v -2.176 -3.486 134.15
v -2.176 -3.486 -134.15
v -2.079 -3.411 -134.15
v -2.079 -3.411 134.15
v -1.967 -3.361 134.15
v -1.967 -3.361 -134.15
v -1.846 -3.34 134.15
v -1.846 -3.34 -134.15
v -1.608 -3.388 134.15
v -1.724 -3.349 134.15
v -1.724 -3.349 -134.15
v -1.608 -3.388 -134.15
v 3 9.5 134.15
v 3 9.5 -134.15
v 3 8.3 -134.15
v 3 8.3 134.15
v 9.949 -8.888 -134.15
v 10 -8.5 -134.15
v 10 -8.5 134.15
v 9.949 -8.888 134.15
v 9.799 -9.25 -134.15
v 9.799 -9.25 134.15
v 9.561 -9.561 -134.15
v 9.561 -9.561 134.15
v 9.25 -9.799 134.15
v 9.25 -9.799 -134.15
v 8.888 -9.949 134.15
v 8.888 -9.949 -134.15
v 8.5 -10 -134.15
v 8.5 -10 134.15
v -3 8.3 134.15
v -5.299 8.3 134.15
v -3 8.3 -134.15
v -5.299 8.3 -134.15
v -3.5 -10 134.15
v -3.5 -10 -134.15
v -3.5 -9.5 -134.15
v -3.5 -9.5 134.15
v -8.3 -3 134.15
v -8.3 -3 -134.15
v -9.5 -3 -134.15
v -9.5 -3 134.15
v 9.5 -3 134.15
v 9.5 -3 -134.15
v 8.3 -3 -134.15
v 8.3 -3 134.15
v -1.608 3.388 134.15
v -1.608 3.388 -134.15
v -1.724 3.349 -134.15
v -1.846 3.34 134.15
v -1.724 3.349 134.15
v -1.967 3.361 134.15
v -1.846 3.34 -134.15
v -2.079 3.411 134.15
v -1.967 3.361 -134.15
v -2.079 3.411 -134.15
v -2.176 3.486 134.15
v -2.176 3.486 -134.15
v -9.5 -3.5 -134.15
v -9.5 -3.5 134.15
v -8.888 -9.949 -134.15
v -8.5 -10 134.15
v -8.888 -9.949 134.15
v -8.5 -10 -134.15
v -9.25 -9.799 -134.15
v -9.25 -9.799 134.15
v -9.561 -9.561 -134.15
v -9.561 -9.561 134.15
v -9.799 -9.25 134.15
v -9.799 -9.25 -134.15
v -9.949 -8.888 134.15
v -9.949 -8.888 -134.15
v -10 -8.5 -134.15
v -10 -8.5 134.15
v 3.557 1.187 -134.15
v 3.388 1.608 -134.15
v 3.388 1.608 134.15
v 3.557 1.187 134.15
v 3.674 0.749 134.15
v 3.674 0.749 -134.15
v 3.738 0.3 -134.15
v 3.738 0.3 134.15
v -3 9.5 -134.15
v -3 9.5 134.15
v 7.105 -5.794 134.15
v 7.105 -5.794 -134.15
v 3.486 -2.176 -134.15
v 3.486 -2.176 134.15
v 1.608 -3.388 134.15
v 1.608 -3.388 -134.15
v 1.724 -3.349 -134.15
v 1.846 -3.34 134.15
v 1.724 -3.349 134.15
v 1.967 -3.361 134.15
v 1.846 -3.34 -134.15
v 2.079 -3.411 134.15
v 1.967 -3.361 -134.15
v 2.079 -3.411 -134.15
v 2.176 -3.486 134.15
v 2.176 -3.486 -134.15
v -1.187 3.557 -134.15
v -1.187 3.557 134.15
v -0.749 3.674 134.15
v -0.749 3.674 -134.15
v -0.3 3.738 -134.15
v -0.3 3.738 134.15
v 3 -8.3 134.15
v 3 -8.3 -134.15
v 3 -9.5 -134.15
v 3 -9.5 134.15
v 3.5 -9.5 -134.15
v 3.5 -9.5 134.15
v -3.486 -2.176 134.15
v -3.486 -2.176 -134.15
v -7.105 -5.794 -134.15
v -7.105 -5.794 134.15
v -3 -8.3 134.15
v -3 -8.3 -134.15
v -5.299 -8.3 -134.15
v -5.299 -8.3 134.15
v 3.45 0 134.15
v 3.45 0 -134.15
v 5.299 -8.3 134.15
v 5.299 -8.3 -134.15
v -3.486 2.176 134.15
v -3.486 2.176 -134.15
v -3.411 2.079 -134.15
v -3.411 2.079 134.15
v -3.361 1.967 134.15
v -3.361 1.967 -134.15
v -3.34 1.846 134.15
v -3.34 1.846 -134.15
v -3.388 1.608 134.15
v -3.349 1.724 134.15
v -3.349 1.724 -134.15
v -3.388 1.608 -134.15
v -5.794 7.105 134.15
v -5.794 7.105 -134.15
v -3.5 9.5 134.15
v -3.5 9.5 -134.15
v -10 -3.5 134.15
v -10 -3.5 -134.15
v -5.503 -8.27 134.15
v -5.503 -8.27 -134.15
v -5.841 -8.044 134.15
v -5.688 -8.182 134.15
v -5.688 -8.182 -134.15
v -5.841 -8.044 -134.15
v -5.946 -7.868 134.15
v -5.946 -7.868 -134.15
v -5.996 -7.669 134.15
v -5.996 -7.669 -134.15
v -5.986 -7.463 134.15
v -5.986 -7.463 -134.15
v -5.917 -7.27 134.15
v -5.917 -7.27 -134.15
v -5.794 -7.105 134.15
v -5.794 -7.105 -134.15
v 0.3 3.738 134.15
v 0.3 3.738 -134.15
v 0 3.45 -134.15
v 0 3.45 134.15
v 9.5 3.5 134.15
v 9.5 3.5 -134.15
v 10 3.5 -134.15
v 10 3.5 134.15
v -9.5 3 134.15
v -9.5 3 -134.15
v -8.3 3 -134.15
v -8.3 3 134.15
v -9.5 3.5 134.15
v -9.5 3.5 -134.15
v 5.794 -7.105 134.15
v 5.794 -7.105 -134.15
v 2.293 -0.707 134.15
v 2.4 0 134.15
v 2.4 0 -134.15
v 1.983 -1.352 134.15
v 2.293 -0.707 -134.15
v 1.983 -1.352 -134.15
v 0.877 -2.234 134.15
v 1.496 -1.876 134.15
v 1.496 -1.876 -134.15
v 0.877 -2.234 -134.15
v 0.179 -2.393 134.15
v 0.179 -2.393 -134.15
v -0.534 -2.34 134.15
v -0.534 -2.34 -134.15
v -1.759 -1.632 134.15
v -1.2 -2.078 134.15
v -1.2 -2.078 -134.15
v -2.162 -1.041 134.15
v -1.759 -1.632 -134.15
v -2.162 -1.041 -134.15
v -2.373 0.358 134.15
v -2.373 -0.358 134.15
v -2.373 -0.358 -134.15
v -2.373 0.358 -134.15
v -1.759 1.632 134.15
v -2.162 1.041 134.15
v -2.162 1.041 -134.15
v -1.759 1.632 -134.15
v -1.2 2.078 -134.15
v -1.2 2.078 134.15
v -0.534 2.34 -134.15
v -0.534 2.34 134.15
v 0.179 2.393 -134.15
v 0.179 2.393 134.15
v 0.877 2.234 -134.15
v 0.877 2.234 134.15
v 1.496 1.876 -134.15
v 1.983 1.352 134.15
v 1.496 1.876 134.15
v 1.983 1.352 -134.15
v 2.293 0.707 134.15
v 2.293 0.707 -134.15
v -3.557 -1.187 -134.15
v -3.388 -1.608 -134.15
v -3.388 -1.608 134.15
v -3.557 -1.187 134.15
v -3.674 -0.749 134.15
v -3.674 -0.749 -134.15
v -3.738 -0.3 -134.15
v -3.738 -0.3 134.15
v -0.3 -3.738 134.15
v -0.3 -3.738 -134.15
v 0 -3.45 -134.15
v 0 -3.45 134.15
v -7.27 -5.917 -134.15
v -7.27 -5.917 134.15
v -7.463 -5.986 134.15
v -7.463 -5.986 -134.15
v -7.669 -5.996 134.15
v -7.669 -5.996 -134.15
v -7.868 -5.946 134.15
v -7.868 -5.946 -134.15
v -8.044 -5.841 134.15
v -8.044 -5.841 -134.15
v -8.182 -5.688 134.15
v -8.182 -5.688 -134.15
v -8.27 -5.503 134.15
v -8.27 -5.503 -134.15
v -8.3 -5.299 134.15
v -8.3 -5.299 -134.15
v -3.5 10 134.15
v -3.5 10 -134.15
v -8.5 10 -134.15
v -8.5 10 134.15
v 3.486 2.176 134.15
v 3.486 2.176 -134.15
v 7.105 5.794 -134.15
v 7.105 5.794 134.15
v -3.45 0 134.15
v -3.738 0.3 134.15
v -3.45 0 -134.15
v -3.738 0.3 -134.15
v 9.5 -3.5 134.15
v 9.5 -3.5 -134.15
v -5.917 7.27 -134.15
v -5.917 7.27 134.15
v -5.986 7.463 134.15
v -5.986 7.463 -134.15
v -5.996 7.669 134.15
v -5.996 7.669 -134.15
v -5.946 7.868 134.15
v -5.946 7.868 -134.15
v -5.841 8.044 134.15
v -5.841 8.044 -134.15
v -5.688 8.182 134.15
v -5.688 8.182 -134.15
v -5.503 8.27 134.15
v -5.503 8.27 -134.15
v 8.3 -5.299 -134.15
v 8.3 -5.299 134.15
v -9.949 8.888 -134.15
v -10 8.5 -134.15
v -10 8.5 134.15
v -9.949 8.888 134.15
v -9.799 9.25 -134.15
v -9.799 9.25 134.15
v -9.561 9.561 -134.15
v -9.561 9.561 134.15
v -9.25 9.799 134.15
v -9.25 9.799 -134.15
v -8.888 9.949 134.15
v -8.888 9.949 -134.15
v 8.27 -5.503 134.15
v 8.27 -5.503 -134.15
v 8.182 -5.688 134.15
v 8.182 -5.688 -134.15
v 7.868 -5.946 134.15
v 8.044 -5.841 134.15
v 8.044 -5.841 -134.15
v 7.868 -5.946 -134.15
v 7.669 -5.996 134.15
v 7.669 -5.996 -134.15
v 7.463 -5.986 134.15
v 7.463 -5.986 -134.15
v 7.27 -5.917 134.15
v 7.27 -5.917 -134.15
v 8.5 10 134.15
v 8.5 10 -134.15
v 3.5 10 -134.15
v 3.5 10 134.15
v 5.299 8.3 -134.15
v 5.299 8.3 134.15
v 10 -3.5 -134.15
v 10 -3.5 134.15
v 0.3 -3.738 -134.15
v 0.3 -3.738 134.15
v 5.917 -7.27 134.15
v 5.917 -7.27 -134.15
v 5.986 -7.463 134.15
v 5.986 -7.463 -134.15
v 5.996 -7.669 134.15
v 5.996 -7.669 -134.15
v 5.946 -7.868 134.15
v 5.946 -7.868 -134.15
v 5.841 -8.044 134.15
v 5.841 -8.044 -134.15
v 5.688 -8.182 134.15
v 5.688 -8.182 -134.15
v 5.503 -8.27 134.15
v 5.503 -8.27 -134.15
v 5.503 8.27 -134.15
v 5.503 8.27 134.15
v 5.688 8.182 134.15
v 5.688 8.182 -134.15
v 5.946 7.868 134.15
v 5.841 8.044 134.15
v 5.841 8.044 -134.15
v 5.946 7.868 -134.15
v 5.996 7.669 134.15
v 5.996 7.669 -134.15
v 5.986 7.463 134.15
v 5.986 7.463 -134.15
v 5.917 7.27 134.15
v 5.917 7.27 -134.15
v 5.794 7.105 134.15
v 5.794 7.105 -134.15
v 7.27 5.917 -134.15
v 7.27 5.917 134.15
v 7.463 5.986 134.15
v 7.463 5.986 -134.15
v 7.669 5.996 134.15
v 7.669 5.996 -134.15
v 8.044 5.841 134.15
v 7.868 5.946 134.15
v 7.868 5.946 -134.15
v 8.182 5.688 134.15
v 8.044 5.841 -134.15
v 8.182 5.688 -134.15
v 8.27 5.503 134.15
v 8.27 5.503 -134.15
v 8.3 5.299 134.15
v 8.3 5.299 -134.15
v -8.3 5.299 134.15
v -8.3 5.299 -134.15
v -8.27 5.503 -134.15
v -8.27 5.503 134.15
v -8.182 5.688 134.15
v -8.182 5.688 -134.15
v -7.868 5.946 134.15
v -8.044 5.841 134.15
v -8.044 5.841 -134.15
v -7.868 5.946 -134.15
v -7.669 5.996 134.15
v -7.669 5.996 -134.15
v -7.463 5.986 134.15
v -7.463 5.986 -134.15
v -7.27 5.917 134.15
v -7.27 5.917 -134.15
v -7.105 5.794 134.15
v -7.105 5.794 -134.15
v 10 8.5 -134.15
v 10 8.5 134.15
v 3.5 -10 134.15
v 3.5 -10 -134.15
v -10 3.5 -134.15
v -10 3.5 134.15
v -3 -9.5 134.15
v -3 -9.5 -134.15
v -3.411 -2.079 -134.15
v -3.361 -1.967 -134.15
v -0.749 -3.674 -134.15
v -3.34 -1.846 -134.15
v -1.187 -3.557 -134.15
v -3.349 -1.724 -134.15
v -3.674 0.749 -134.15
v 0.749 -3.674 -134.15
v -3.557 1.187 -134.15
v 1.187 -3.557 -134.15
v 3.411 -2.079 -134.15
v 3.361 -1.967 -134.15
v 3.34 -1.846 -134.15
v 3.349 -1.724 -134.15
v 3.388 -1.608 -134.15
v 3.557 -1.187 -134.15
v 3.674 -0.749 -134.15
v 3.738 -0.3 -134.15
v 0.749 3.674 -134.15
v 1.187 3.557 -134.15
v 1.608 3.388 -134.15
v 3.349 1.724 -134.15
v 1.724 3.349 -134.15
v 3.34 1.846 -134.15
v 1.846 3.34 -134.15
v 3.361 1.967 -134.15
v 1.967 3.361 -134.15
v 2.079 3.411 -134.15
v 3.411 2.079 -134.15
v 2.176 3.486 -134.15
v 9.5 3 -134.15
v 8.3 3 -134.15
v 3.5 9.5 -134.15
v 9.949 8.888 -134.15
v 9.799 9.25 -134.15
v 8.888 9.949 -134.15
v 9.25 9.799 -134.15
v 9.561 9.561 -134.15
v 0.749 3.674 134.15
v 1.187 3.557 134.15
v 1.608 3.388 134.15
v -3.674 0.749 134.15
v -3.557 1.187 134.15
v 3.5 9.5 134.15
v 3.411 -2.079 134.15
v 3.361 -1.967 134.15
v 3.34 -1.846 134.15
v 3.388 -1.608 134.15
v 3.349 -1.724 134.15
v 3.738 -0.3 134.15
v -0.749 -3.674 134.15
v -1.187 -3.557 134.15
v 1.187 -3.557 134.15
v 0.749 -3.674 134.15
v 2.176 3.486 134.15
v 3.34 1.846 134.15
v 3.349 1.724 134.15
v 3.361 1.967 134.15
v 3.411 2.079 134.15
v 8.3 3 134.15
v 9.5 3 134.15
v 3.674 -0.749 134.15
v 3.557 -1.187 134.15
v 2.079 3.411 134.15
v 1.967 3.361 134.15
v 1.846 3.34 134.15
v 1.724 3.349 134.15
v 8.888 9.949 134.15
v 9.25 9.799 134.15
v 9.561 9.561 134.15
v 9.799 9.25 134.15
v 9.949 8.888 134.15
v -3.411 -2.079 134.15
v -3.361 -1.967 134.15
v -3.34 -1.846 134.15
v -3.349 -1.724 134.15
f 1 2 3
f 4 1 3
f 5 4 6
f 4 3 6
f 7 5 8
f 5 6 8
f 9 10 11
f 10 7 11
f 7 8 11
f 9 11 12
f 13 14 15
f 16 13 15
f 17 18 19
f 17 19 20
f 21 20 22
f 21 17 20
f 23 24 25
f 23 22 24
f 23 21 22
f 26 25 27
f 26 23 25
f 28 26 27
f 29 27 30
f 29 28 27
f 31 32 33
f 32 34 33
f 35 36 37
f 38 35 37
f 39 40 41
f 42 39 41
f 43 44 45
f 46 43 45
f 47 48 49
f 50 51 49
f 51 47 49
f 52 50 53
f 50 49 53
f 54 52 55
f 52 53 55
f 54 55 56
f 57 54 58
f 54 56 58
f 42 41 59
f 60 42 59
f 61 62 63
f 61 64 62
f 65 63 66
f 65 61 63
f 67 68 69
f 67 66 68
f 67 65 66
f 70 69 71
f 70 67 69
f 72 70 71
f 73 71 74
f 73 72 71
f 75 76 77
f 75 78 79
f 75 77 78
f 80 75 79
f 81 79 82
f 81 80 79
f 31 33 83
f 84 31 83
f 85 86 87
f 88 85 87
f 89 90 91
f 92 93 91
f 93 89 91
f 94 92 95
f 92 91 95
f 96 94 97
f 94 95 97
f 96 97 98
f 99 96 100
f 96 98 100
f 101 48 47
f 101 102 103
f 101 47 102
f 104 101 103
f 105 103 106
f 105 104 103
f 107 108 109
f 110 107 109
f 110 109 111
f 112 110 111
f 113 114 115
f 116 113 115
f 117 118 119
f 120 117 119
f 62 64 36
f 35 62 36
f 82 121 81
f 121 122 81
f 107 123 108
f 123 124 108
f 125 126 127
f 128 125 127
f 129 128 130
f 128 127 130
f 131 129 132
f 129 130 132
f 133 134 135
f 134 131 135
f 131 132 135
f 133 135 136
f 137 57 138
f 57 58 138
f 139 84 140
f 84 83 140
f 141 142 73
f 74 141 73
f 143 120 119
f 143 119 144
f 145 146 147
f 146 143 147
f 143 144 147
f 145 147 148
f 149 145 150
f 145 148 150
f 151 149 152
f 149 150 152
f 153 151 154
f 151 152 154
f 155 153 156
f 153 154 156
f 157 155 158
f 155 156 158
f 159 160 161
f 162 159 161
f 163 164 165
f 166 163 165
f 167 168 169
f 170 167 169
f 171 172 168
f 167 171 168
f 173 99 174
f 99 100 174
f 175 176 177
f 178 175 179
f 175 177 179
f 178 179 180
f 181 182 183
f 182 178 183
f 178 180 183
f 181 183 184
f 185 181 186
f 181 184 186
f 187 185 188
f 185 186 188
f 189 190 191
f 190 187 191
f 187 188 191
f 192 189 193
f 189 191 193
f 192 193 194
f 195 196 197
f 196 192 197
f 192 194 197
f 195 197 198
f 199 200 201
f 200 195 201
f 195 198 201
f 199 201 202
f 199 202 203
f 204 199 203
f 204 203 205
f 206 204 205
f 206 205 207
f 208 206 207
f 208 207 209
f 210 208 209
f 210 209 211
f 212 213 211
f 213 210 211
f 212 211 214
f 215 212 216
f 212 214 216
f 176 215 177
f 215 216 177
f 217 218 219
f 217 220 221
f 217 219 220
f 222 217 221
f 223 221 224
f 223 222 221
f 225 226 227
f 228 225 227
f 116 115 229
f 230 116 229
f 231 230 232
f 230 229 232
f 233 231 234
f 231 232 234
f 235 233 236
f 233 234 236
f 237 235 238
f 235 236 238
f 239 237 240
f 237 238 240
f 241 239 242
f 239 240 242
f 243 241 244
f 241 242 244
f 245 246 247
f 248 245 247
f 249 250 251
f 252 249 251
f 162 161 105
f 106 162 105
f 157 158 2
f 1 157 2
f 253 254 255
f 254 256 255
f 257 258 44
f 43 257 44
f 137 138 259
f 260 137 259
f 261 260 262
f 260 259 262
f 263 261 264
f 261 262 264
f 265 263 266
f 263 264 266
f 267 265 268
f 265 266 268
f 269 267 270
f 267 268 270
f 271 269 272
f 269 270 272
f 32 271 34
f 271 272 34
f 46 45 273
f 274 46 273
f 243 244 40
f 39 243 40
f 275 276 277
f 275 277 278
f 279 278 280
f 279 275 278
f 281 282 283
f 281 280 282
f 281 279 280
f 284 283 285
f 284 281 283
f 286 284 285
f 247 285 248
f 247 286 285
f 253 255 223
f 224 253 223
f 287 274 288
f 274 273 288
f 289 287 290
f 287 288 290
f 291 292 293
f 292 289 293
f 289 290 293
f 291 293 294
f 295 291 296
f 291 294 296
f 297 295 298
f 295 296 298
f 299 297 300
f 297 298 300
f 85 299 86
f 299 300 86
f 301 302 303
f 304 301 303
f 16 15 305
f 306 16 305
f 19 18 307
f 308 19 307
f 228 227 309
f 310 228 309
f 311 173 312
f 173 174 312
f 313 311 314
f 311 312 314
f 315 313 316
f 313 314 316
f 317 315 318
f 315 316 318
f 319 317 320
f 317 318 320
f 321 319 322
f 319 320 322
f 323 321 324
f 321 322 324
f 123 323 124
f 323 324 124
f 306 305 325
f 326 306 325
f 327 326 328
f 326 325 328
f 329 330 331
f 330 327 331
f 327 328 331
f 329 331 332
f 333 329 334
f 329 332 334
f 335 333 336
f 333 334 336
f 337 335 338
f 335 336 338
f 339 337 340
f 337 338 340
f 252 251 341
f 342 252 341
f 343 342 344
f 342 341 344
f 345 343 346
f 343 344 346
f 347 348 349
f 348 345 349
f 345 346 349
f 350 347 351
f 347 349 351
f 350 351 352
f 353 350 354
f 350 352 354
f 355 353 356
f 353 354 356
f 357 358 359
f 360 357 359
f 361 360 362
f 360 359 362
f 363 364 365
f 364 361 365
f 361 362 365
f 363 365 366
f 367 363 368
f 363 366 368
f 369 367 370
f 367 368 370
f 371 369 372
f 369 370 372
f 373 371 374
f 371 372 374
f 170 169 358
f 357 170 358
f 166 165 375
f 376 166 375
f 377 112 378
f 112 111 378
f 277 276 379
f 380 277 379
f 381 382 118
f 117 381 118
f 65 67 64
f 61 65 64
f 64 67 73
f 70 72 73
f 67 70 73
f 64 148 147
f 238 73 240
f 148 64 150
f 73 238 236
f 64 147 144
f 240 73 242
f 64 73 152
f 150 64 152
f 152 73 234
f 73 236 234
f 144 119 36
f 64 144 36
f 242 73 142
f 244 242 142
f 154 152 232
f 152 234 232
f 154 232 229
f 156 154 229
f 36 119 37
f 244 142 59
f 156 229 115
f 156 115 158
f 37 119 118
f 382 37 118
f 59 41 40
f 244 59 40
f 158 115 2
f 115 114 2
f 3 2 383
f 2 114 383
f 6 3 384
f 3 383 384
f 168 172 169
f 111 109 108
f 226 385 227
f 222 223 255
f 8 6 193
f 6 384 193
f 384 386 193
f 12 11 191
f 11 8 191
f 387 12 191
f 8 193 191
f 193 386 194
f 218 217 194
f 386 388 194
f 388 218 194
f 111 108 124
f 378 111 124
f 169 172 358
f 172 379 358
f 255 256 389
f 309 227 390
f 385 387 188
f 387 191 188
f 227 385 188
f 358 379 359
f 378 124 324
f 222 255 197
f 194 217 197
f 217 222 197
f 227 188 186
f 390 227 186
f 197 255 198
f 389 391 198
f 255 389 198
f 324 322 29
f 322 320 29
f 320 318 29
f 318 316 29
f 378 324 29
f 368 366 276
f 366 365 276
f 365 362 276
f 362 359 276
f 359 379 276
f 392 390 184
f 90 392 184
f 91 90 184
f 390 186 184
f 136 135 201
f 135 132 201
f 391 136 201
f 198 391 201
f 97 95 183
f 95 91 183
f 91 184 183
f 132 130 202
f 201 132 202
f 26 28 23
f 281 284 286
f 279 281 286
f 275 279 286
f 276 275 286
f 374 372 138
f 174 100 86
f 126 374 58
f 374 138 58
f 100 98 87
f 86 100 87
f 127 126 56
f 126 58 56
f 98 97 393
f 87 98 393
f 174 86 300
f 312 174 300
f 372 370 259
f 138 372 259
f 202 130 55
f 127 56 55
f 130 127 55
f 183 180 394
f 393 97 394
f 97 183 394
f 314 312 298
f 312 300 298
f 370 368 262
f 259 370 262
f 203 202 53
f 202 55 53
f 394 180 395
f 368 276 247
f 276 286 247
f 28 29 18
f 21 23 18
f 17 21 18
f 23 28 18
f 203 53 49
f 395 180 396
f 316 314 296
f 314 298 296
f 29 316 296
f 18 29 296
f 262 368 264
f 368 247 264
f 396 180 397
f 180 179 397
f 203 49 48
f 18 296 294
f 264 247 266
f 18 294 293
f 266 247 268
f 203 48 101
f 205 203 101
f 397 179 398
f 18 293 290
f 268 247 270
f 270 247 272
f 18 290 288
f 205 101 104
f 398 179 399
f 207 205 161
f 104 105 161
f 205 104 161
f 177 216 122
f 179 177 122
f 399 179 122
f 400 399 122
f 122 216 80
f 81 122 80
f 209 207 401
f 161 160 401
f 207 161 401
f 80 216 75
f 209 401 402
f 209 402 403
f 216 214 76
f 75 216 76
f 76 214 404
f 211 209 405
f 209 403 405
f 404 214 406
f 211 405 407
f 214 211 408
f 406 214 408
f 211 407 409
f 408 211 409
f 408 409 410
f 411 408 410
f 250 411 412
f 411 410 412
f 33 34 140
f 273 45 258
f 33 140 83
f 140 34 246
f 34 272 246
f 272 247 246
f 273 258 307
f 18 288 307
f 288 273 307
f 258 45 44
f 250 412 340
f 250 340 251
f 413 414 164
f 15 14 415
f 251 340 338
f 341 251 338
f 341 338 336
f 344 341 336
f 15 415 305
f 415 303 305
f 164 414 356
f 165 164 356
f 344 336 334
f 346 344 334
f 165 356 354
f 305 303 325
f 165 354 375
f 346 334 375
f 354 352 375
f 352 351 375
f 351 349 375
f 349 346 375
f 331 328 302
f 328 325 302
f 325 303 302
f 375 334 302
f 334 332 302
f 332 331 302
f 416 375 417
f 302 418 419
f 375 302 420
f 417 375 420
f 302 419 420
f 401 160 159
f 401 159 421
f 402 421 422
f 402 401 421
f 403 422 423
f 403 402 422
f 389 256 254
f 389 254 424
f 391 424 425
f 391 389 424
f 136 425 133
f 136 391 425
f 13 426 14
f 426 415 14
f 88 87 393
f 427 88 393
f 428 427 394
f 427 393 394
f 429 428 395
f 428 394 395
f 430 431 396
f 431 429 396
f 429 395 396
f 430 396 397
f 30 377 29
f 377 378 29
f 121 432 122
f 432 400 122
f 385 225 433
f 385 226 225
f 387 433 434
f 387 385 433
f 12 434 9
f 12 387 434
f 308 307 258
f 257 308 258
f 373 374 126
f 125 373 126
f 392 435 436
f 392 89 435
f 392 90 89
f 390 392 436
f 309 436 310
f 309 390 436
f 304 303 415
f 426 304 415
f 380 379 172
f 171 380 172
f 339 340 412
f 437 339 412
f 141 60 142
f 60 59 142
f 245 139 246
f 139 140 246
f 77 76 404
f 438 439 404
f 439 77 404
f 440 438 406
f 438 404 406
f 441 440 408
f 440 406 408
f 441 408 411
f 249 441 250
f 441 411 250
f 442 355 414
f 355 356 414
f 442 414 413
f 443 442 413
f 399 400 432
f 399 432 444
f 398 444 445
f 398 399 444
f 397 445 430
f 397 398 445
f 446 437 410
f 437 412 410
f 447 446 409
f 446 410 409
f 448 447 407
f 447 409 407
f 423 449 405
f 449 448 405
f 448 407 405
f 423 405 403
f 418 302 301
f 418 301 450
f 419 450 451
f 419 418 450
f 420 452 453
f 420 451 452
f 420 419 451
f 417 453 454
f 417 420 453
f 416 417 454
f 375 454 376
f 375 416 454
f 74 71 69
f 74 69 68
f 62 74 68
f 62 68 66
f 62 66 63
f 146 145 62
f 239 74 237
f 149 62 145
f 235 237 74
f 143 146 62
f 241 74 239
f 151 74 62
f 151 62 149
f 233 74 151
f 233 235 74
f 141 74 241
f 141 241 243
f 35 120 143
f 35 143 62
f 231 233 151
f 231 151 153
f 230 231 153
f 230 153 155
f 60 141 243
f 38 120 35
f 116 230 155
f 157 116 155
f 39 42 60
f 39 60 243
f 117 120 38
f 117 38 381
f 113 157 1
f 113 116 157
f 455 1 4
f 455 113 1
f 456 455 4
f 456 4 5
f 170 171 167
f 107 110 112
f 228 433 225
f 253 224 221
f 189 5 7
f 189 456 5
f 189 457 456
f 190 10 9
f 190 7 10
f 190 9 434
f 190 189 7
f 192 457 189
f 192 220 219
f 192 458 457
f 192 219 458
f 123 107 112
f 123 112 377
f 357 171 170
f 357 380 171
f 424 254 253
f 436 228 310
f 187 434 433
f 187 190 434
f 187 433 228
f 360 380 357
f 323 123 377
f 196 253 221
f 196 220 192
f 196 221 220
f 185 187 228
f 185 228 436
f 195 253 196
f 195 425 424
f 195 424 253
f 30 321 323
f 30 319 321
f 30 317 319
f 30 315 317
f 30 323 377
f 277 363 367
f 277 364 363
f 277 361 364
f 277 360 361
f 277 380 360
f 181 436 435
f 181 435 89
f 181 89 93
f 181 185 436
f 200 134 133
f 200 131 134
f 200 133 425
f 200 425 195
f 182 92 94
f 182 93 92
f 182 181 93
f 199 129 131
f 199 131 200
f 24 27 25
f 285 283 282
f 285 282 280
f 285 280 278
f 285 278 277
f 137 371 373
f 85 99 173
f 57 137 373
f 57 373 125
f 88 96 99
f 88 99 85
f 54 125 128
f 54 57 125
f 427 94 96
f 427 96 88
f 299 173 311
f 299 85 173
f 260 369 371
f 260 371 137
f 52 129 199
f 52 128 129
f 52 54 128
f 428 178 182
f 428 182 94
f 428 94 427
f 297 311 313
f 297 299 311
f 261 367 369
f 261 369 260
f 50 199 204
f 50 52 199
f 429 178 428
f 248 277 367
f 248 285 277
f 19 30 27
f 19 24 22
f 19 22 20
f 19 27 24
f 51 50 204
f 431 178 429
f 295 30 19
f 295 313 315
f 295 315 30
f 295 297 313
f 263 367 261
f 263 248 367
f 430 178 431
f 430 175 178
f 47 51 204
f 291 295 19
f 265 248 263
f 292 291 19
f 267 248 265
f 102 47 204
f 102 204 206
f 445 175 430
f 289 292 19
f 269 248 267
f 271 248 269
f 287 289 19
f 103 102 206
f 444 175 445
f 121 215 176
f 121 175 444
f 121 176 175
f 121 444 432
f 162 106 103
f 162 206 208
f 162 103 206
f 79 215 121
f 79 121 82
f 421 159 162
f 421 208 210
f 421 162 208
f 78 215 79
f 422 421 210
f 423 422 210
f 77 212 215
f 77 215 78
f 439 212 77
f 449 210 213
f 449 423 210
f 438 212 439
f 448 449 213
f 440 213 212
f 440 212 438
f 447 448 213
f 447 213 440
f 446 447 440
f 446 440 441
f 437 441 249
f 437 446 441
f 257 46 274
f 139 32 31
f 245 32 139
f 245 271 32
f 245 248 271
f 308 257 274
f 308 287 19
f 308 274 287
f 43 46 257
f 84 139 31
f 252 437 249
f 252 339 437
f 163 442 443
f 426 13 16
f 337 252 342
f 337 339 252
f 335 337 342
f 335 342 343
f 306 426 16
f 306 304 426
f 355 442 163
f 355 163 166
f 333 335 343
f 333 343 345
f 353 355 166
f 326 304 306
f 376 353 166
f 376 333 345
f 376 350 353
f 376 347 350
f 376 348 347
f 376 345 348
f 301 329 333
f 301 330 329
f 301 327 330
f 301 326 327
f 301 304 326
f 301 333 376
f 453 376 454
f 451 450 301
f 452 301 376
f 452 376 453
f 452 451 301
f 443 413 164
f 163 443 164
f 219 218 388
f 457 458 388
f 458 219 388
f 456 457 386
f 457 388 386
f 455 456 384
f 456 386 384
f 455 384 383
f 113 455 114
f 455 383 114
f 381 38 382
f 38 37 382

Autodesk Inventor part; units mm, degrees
ref_plane "YZ Plane" through (0, 0, 0) normal (1, 0, 0) x (0, 1, 0)
ref_plane "XZ Plane" through (0, 0, 0) normal (0, 1, 0) x (-1, 0, 0)
ref_plane "XY Plane" through (0, 0, 0) normal (0, 0, 1) x (1, 0, 0)
sketch "Esquisse1" plane through (0, 0, 0) normal (0, 0, 1) x (1, 0, 0)
  line L0 (-8.5, -10) -> (-3.5, -10)
  line L1 (-3.5, -10) -> (-3.5, -9.5)
  line L2 (-3.5, -9.5) -> (-3, -9.5)
  line L3 (-3, -9.5) -> (-3, -8.3)
  line L4 (-3, -8.3) -> (-5.2994, -8.3)
  arc A0 (-5.7944, -7.105) -> (-5.2994, -8.3) centre (-5.2994, -7.6) ccw
  line L5 (-5.7944, -7.105) -> (-2.1755, -3.4861)
  arc A1 (-1.6076, -3.388) -> (-2.1755, -3.4861) centre (-1.8219, -3.8397) ccw
  arc A2 (-1.6076, -3.388) -> (-0.3, -3.738) centre (0, 0) ccw
  line L6 (-0.3, -3.738) -> (0, -3.45)
  line L7 (0, -3.45) -> (0.3, -3.738)
  arc A3 (0.3, -3.738) -> (1.6076, -3.388) centre (0, 0) ccw
  arc A4 (2.1755, -3.4861) -> (1.6076, -3.388) centre (1.8219, -3.8397) ccw
  line L8 (2.1755, -3.4861) -> (5.7944, -7.105)
  arc A5 (5.2994, -8.3) -> (5.7944, -7.105) centre (5.2994, -7.6) ccw
  line L9 (5.2994, -8.3) -> (3, -8.3)
  line L10 (3, -8.3) -> (3, -9.5)
  line L11 (3, -9.5) -> (3.5, -9.5)
  line L12 (3.5, -9.5) -> (3.5, -10)
  line L13 (3.5, -10) -> (8.5, -10)
  arc A6 (8.5, -10) -> (10, -8.5) centre (8.5, -8.5) ccw
  line L14 (10, -8.5) -> (10, -3.5)
  line L15 (10, -3.5) -> (9.5, -3.5)
  line L16 (9.5, -3.5) -> (9.5, -3)
  line L17 (9.5, -3) -> (8.3, -3)
  line L18 (8.3, -3) -> (8.3, -5.2994)
  arc A7 (7.105, -5.7944) -> (8.3, -5.2994) centre (7.6, -5.2994) ccw
  line L19 (7.105, -5.7944) -> (3.4861, -2.1755)
  arc A8 (3.388, -1.6076) -> (3.4861, -2.1755) centre (3.8397, -1.8219) ccw
  arc A9 (3.388, -1.6076) -> (3.738, -0.3) centre (0, 0) ccw
  line L20 (3.738, -0.3) -> (3.45, 0)
  line L21 (3.45, 0) -> (3.738, 0.3)
  arc A10 (3.738, 0.3) -> (3.388, 1.6076) centre (0, 0) ccw
  arc A11 (3.4861, 2.1755) -> (3.388, 1.6076) centre (3.8397, 1.8219) ccw
  line L22 (3.4861, 2.1755) -> (7.105, 5.7944)
  arc A12 (8.3, 5.2994) -> (7.105, 5.7944) centre (7.6, 5.2994) ccw
  line L23 (8.3, 5.2994) -> (8.3, 3)
  line L24 (8.3, 3) -> (9.5, 3)
  line L25 (9.5, 3) -> (9.5, 3.5)
  line L26 (9.5, 3.5) -> (10, 3.5)
  line L27 (10, 3.5) -> (10, 8.5)
  arc A13 (10, 8.5) -> (8.5, 10) centre (8.5, 8.5) ccw
  line L28 (8.5, 10) -> (3.5, 10)
  line L29 (3.5, 10) -> (3.5, 9.5)
  line L30 (3.5, 9.5) -> (3, 9.5)
  line L31 (3, 9.5) -> (3, 8.3)
  line L32 (3, 8.3) -> (5.2994, 8.3)
  arc A14 (5.7944, 7.105) -> (5.2994, 8.3) centre (5.2994, 7.6) ccw
  line L33 (5.7944, 7.105) -> (2.1755, 3.4861)
  arc A15 (1.6076, 3.388) -> (2.1755, 3.4861) centre (1.8219, 3.8397) ccw
  arc A16 (1.6076, 3.388) -> (0.3, 3.738) centre (0, 0) ccw
  line L34 (0.3, 3.738) -> (0, 3.45)
  line L35 (0, 3.45) -> (-0.3, 3.738)
  arc A17 (-0.3, 3.738) -> (-1.6076, 3.388) centre (0, 0) ccw
  arc A18 (-2.1755, 3.4861) -> (-1.6076, 3.388) centre (-1.8219, 3.8397) ccw
  line L36 (-2.1755, 3.4861) -> (-5.7944, 7.105)
  arc A19 (-5.2994, 8.3) -> (-5.7944, 7.105) centre (-5.2994, 7.6) ccw
  line L37 (-5.2994, 8.3) -> (-3, 8.3)
  line L38 (-3, 8.3) -> (-3, 9.5)
  line L39 (-3, 9.5) -> (-3.5, 9.5)
  line L40 (-3.5, 9.5) -> (-3.5, 10)
  line L41 (-3.5, 10) -> (-8.5, 10)
  arc A20 (-8.5, 10) -> (-10, 8.5) centre (-8.5, 8.5) ccw
  line L42 (-10, 8.5) -> (-10, 3.5)
  line L43 (-10, 3.5) -> (-9.5, 3.5)
  line L44 (-9.5, 3.5) -> (-9.5, 3)
  line L45 (-9.5, 3) -> (-8.3, 3)
  line L46 (-8.3, 3) -> (-8.3, 5.2994)
  arc A21 (-7.105, 5.7944) -> (-8.3, 5.2994) centre (-7.6, 5.2994) ccw
  line L47 (-7.105, 5.7944) -> (-3.4861, 2.1755)
  arc A22 (-3.388, 1.6076) -> (-3.4861, 2.1755) centre (-3.8397, 1.8219) ccw
  arc A23 (-3.388, 1.6076) -> (-3.738, 0.3) centre (0, 0) ccw
  line L48 (-3.738, 0.3) -> (-3.45, 0)
  line L49 (-3.45, 0) -> (-3.738, -0.3)
  arc A24 (-3.738, -0.3) -> (-3.388, -1.6076) centre (0, 0) ccw
  arc A25 (-3.4861, -2.1755) -> (-3.388, -1.6076) centre (-3.8397, -1.8219) ccw
  line L50 (-3.4861, -2.1755) -> (-7.105, -5.7944)
  arc A26 (-8.3, -5.2994) -> (-7.105, -5.7944) centre (-7.6, -5.2994) ccw
  line L51 (-8.3, -5.2994) -> (-8.3, -3)
  line L52 (-8.3, -3) -> (-9.5, -3)
  line L53 (-9.5, -3) -> (-9.5, -3.5)
  line L54 (-9.5, -3.5) -> (-10, -3.5)
  line L55 (-10, -3.5) -> (-10, -8.5)
  arc A27 (-10, -8.5) -> (-8.5, -10) centre (-8.5, -8.5) ccw
  circle A28 centre (0, 0) radius 2.4
  dimension "d2" = 4.8
extrude "Extrusion1" add sketch "Esquisse1" along normal mid plane 268.3
properties part number "Profilés du réduit 20x20"
